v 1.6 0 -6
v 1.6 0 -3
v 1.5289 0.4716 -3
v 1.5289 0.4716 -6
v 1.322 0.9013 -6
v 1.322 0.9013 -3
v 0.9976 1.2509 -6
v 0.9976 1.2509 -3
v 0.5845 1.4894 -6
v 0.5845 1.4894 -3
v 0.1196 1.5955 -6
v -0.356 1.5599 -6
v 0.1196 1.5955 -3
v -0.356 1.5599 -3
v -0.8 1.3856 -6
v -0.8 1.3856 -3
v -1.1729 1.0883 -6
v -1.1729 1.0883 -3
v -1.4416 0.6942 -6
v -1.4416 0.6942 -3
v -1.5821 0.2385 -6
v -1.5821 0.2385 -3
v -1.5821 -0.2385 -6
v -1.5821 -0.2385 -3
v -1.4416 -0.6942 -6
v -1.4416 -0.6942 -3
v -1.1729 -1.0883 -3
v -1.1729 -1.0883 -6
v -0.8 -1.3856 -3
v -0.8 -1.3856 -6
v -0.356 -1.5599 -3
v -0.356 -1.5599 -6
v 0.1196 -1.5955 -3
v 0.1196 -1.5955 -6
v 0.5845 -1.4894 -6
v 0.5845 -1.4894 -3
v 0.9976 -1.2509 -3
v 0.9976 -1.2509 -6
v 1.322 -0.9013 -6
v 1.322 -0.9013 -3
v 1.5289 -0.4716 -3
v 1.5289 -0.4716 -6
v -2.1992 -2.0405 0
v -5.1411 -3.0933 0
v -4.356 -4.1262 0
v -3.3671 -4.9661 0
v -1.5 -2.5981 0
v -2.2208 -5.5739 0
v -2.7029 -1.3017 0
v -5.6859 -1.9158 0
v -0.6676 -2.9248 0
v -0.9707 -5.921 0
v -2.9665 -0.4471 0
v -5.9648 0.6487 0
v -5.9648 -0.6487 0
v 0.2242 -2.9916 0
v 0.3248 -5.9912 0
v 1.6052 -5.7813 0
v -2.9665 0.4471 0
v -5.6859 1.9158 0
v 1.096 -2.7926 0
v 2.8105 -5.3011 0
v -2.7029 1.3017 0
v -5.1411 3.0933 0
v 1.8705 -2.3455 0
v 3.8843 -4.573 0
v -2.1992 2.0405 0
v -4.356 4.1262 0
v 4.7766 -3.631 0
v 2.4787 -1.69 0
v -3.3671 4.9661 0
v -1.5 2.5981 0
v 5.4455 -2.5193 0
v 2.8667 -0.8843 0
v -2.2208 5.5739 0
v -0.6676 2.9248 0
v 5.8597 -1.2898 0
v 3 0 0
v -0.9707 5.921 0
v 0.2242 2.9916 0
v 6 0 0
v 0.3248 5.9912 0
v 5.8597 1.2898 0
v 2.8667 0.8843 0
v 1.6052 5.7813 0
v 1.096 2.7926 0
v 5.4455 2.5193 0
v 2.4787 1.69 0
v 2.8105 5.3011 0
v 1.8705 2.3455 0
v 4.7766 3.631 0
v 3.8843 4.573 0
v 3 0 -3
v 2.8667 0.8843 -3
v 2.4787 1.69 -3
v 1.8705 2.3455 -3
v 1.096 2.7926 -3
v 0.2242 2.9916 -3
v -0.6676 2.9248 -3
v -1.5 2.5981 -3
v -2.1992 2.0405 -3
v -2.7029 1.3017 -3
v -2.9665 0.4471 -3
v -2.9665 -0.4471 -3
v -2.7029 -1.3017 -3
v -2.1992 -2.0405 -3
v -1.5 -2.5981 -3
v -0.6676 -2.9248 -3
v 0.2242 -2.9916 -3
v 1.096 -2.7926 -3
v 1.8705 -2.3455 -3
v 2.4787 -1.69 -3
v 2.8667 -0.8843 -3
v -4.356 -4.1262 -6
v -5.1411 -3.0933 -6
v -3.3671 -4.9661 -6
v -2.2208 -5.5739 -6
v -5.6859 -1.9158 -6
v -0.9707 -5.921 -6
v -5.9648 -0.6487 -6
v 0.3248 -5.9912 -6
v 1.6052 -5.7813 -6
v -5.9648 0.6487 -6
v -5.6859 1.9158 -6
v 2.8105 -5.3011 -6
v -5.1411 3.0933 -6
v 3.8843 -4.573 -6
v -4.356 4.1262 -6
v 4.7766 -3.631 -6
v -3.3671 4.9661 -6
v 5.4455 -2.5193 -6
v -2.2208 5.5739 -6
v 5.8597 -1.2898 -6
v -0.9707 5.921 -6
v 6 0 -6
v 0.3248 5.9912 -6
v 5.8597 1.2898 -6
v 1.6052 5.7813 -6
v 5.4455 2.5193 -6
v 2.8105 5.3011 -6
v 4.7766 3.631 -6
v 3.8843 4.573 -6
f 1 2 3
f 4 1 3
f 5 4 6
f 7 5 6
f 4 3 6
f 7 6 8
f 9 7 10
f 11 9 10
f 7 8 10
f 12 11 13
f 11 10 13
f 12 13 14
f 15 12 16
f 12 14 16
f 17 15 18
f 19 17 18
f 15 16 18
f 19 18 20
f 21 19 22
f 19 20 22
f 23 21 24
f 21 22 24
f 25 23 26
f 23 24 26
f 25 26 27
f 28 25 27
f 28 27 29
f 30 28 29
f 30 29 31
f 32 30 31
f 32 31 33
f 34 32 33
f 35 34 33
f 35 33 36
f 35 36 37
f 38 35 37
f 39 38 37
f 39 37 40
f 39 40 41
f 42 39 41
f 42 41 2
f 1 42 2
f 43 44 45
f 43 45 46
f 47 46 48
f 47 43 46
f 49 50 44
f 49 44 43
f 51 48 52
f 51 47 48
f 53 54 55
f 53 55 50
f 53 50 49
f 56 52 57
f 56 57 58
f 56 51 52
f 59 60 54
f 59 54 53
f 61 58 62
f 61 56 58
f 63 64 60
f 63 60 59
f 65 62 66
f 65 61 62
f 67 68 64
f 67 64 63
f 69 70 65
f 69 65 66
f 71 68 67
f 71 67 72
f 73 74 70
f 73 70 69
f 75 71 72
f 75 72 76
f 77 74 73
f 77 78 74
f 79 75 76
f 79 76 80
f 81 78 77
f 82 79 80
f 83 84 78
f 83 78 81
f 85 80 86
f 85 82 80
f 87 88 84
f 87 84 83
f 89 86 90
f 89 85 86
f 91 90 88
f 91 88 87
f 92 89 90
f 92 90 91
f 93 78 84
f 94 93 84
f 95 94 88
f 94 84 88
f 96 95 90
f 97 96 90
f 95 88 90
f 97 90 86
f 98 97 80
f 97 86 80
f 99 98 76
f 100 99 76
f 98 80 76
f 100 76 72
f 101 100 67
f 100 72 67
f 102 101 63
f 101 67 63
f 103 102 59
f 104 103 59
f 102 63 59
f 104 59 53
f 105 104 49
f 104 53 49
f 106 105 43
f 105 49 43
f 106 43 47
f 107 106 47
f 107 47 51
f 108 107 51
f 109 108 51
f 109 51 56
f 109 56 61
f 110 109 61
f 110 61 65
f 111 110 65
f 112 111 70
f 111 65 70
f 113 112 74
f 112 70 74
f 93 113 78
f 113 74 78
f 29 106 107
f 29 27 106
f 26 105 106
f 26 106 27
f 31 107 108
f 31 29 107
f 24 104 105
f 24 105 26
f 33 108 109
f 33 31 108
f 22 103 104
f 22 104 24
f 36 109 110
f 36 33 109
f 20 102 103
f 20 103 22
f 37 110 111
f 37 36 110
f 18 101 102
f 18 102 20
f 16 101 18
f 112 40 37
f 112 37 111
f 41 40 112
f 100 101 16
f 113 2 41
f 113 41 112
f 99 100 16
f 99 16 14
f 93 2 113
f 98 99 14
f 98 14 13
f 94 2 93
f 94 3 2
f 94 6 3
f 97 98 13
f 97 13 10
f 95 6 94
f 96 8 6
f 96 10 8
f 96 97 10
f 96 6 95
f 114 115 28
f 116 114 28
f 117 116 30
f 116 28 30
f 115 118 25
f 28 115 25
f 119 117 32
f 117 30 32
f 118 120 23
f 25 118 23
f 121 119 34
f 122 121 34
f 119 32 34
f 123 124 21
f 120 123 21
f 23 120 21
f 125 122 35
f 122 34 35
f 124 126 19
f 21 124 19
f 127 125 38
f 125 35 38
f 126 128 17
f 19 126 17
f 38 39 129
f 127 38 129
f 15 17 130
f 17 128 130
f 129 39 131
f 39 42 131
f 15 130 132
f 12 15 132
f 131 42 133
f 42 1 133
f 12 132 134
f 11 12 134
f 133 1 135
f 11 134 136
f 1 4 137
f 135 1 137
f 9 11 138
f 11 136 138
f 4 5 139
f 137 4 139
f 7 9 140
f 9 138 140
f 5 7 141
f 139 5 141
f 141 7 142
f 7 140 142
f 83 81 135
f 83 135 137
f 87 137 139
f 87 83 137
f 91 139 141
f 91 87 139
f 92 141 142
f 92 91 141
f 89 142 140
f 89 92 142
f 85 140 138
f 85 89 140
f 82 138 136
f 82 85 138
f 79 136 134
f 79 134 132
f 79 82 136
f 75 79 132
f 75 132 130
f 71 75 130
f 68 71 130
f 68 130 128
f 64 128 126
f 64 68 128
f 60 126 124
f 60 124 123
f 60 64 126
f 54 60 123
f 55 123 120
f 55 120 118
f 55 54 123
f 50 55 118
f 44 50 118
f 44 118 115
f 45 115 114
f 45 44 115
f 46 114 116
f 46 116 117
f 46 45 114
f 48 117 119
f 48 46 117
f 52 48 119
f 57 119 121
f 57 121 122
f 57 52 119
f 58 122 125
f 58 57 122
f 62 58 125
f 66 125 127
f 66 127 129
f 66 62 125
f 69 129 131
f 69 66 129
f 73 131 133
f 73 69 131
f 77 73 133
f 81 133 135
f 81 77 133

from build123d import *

# Parameters (mm, degrees)
SKETCH_1_R          = 6
EXTRUDE_1_DEPTH     = 6
SKETCH_1_4_R        = 3
CUT_EXTRUDE_2_DEPTH = 3
HOLE_WIZARD_M3_1_D  = 3.2


with BuildPart() as part:
    # ｽｹｯﾁ1 → ﾎﾞｽ - 押し出し1 (new body)
    with BuildSketch(Plane.XY):
        Circle(SKETCH_1_R)
    extrude(amount=-EXTRUDE_1_DEPTH)

    # ｽｹｯﾁ1<4> → ｶｯﾄ - 押し出し2 (cut)
    with BuildSketch(Plane.XY):
        Circle(SKETCH_1_4_R)
    extrude(amount=-CUT_EXTRUDE_2_DEPTH, mode=Mode.SUBTRACT)

    # M3 すきま穴1 (through all)
    with Locations(Plane(origin=(0, 0, -6), x_dir=(-1, 0, 0), z_dir=(0, 0, -1))):
        with Locations((0, 0)):
            Hole(HOLE_WIZARD_M3_1_D / 2)


solid = part.part
